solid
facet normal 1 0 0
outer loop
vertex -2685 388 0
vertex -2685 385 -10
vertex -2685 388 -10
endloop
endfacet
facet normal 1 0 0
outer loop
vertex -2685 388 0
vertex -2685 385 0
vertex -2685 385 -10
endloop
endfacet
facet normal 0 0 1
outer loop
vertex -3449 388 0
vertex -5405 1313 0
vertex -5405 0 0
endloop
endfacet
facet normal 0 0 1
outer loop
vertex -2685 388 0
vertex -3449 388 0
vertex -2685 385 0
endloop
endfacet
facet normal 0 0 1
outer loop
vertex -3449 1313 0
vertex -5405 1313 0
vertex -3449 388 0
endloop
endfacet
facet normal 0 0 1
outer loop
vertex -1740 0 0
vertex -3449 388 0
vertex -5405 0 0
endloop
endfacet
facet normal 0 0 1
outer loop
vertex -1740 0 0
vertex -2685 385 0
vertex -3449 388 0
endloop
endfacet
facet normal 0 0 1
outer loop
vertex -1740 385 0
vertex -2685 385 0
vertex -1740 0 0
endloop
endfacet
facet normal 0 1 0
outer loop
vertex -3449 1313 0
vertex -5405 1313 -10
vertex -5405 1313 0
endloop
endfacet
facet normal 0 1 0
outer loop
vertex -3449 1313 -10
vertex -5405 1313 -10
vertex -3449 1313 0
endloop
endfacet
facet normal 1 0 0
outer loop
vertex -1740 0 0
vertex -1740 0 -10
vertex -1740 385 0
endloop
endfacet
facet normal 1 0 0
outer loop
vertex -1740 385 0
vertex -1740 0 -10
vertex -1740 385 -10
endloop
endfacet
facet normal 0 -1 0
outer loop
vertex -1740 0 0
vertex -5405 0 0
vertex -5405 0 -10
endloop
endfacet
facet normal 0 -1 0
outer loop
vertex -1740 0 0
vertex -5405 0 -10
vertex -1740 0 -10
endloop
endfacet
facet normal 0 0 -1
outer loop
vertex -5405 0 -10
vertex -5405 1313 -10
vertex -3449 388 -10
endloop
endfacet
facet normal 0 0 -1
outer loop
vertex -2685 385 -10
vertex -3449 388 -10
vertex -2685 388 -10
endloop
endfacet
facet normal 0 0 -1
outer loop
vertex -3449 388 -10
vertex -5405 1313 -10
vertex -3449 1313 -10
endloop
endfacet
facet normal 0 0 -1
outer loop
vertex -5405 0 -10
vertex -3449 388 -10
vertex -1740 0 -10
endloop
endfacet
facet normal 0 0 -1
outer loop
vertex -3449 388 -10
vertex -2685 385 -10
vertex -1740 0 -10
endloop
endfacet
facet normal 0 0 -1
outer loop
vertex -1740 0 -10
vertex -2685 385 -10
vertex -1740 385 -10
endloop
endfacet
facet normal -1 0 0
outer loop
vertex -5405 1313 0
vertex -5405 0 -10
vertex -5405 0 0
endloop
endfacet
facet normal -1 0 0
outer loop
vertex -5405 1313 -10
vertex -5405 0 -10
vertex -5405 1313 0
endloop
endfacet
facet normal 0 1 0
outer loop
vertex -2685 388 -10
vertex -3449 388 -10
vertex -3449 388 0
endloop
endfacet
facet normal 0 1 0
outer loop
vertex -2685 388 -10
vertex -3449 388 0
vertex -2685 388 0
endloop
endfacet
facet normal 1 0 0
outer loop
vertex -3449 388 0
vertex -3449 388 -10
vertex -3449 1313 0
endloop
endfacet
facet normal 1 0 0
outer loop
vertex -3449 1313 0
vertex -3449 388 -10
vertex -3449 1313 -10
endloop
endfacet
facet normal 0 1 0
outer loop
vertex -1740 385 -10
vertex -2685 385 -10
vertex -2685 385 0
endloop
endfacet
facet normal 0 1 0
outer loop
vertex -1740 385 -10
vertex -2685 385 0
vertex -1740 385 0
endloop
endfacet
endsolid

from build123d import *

# Parameters (mm, degrees)
TABAN_FLAN_1_DEPTH         = 10
KES_EKSTR_ZYON1_DEPTH      = 6514.086825769
KES_EKSTR_ZYON1_DEPTH_BACK = 6514.086825769
IZIM2_W                    = 605
IZIM2_H                    = 2510
KES_EKSTR_ZYON2_DEPTH      = 5960.381259829
KES_EKSTR_ZYON2_DEPTH_BACK = 5960.381259829
IZIM3_W                    = 1345
IZIM3_H                    = 1305
KES_EKSTR_ZYON3_DEPTH      = 5960.381259829
KES_EKSTR_ZYON3_DEPTH_BACK = 5960.381259829
IZIM4_W                    = 3
IZIM4_H                    = 385
KES_EKSTR_ZYON4_DEPTH      = 5960.381259829
KES_EKSTR_ZYON4_DEPTH_BACK = 5960.381259829
IZIM6_W                    = 1737
IZIM6_H                    = 385
IZIM6_W_2                  = 2720
IZIM6_H_2                  = 857
KES_EKSTR_ZYON5_DEPTH      = 5653.126502477
KES_EKSTR_ZYON5_DEPTH_BACK = 5653.126502477
IZIM7_W                    = 764
IZIM7_H                    = 925


# Sheet-metal steps are written as plain solids
with BuildPart() as part:
    # Çizim1 → Taban-Flanş1 (new body)
    with BuildSketch(Plane.XY):
        Polygon((0, 0), (0, 1755), (-2685, 1755), (-2685, 2510), (-6010, 2510), (-6010, 0), align=None)
    extrude(amount=-TABAN_FLAN_1_DEPTH)

    # Çizim2 → Kes-Ekstrüzyon1 (cut, two sides: drawn at the far end of the back side and taken through both)
    with BuildSketch(Plane.XY.offset(-KES_EKSTR_ZYON1_DEPTH_BACK)):
        with Locations((-5707.5, 1255)):
            Rectangle(IZIM2_W, IZIM2_H)
    extrude(amount=KES_EKSTR_ZYON1_DEPTH + KES_EKSTR_ZYON1_DEPTH_BACK, mode=Mode.SUBTRACT)

    # Çizim3 → Kes-Ekstrüzyon2 (cut, two sides: drawn at the far end of the back side and taken through both)
    with BuildSketch(Plane.XY.offset(-KES_EKSTR_ZYON2_DEPTH_BACK)):
        with Locations((-672.5, 1102.5)):
            Rectangle(IZIM3_W, IZIM3_H)
    extrude(amount=KES_EKSTR_ZYON2_DEPTH + KES_EKSTR_ZYON2_DEPTH_BACK, mode=Mode.SUBTRACT)

    # Çizim4 → Kes-Ekstrüzyon3 (cut, two sides: drawn at the far end of the back side and taken through both)
    with BuildSketch(Plane.XY.offset(-KES_EKSTR_ZYON3_DEPTH_BACK)):
        Polygon((-1345, 1755), (-2685, 1755), (-2685, 385), (-1345, 385), (-1345, 450), align=None)
        with Locations((-1.5, 192.5)):
            Rectangle(IZIM4_W, IZIM4_H)
        Polygon((0, 450), (-1345, 450), (-1345, 385), (-3, 385), (0, 385), align=None)
    extrude(amount=KES_EKSTR_ZYON3_DEPTH + KES_EKSTR_ZYON3_DEPTH_BACK, mode=Mode.SUBTRACT)

    # Çizim6 → Kes-Ekstrüzyon4 (cut, two sides: drawn at the far end of the back side and taken through both)
    with BuildSketch(Plane.XY.offset(-KES_EKSTR_ZYON4_DEPTH_BACK)):
        with Locations((-871.5, 192.5)):
            Rectangle(IZIM6_W, IZIM6_H)
        with Locations((-4045, 2081.5)):
            Rectangle(IZIM6_W_2, IZIM6_H_2)
    extrude(amount=KES_EKSTR_ZYON4_DEPTH + KES_EKSTR_ZYON4_DEPTH_BACK, mode=Mode.SUBTRACT)

    # Çizim7 → Kes-Ekstrüzyon5 (cut, two sides: drawn at the far end of the back side and taken through both)
    with BuildSketch(Plane.XY.offset(-KES_EKSTR_ZYON5_DEPTH_BACK)):
        with Locations((-3067, 850.5)):
            Rectangle(IZIM7_W, IZIM7_H)
        Polygon((-2685, 1653), (-5405, 1653), (-5405, 1313), (-3449, 1313), (-2685, 1313), align=None)
    extrude(amount=KES_EKSTR_ZYON5_DEPTH + KES_EKSTR_ZYON5_DEPTH_BACK, mode=Mode.SUBTRACT)


solid = part.part
